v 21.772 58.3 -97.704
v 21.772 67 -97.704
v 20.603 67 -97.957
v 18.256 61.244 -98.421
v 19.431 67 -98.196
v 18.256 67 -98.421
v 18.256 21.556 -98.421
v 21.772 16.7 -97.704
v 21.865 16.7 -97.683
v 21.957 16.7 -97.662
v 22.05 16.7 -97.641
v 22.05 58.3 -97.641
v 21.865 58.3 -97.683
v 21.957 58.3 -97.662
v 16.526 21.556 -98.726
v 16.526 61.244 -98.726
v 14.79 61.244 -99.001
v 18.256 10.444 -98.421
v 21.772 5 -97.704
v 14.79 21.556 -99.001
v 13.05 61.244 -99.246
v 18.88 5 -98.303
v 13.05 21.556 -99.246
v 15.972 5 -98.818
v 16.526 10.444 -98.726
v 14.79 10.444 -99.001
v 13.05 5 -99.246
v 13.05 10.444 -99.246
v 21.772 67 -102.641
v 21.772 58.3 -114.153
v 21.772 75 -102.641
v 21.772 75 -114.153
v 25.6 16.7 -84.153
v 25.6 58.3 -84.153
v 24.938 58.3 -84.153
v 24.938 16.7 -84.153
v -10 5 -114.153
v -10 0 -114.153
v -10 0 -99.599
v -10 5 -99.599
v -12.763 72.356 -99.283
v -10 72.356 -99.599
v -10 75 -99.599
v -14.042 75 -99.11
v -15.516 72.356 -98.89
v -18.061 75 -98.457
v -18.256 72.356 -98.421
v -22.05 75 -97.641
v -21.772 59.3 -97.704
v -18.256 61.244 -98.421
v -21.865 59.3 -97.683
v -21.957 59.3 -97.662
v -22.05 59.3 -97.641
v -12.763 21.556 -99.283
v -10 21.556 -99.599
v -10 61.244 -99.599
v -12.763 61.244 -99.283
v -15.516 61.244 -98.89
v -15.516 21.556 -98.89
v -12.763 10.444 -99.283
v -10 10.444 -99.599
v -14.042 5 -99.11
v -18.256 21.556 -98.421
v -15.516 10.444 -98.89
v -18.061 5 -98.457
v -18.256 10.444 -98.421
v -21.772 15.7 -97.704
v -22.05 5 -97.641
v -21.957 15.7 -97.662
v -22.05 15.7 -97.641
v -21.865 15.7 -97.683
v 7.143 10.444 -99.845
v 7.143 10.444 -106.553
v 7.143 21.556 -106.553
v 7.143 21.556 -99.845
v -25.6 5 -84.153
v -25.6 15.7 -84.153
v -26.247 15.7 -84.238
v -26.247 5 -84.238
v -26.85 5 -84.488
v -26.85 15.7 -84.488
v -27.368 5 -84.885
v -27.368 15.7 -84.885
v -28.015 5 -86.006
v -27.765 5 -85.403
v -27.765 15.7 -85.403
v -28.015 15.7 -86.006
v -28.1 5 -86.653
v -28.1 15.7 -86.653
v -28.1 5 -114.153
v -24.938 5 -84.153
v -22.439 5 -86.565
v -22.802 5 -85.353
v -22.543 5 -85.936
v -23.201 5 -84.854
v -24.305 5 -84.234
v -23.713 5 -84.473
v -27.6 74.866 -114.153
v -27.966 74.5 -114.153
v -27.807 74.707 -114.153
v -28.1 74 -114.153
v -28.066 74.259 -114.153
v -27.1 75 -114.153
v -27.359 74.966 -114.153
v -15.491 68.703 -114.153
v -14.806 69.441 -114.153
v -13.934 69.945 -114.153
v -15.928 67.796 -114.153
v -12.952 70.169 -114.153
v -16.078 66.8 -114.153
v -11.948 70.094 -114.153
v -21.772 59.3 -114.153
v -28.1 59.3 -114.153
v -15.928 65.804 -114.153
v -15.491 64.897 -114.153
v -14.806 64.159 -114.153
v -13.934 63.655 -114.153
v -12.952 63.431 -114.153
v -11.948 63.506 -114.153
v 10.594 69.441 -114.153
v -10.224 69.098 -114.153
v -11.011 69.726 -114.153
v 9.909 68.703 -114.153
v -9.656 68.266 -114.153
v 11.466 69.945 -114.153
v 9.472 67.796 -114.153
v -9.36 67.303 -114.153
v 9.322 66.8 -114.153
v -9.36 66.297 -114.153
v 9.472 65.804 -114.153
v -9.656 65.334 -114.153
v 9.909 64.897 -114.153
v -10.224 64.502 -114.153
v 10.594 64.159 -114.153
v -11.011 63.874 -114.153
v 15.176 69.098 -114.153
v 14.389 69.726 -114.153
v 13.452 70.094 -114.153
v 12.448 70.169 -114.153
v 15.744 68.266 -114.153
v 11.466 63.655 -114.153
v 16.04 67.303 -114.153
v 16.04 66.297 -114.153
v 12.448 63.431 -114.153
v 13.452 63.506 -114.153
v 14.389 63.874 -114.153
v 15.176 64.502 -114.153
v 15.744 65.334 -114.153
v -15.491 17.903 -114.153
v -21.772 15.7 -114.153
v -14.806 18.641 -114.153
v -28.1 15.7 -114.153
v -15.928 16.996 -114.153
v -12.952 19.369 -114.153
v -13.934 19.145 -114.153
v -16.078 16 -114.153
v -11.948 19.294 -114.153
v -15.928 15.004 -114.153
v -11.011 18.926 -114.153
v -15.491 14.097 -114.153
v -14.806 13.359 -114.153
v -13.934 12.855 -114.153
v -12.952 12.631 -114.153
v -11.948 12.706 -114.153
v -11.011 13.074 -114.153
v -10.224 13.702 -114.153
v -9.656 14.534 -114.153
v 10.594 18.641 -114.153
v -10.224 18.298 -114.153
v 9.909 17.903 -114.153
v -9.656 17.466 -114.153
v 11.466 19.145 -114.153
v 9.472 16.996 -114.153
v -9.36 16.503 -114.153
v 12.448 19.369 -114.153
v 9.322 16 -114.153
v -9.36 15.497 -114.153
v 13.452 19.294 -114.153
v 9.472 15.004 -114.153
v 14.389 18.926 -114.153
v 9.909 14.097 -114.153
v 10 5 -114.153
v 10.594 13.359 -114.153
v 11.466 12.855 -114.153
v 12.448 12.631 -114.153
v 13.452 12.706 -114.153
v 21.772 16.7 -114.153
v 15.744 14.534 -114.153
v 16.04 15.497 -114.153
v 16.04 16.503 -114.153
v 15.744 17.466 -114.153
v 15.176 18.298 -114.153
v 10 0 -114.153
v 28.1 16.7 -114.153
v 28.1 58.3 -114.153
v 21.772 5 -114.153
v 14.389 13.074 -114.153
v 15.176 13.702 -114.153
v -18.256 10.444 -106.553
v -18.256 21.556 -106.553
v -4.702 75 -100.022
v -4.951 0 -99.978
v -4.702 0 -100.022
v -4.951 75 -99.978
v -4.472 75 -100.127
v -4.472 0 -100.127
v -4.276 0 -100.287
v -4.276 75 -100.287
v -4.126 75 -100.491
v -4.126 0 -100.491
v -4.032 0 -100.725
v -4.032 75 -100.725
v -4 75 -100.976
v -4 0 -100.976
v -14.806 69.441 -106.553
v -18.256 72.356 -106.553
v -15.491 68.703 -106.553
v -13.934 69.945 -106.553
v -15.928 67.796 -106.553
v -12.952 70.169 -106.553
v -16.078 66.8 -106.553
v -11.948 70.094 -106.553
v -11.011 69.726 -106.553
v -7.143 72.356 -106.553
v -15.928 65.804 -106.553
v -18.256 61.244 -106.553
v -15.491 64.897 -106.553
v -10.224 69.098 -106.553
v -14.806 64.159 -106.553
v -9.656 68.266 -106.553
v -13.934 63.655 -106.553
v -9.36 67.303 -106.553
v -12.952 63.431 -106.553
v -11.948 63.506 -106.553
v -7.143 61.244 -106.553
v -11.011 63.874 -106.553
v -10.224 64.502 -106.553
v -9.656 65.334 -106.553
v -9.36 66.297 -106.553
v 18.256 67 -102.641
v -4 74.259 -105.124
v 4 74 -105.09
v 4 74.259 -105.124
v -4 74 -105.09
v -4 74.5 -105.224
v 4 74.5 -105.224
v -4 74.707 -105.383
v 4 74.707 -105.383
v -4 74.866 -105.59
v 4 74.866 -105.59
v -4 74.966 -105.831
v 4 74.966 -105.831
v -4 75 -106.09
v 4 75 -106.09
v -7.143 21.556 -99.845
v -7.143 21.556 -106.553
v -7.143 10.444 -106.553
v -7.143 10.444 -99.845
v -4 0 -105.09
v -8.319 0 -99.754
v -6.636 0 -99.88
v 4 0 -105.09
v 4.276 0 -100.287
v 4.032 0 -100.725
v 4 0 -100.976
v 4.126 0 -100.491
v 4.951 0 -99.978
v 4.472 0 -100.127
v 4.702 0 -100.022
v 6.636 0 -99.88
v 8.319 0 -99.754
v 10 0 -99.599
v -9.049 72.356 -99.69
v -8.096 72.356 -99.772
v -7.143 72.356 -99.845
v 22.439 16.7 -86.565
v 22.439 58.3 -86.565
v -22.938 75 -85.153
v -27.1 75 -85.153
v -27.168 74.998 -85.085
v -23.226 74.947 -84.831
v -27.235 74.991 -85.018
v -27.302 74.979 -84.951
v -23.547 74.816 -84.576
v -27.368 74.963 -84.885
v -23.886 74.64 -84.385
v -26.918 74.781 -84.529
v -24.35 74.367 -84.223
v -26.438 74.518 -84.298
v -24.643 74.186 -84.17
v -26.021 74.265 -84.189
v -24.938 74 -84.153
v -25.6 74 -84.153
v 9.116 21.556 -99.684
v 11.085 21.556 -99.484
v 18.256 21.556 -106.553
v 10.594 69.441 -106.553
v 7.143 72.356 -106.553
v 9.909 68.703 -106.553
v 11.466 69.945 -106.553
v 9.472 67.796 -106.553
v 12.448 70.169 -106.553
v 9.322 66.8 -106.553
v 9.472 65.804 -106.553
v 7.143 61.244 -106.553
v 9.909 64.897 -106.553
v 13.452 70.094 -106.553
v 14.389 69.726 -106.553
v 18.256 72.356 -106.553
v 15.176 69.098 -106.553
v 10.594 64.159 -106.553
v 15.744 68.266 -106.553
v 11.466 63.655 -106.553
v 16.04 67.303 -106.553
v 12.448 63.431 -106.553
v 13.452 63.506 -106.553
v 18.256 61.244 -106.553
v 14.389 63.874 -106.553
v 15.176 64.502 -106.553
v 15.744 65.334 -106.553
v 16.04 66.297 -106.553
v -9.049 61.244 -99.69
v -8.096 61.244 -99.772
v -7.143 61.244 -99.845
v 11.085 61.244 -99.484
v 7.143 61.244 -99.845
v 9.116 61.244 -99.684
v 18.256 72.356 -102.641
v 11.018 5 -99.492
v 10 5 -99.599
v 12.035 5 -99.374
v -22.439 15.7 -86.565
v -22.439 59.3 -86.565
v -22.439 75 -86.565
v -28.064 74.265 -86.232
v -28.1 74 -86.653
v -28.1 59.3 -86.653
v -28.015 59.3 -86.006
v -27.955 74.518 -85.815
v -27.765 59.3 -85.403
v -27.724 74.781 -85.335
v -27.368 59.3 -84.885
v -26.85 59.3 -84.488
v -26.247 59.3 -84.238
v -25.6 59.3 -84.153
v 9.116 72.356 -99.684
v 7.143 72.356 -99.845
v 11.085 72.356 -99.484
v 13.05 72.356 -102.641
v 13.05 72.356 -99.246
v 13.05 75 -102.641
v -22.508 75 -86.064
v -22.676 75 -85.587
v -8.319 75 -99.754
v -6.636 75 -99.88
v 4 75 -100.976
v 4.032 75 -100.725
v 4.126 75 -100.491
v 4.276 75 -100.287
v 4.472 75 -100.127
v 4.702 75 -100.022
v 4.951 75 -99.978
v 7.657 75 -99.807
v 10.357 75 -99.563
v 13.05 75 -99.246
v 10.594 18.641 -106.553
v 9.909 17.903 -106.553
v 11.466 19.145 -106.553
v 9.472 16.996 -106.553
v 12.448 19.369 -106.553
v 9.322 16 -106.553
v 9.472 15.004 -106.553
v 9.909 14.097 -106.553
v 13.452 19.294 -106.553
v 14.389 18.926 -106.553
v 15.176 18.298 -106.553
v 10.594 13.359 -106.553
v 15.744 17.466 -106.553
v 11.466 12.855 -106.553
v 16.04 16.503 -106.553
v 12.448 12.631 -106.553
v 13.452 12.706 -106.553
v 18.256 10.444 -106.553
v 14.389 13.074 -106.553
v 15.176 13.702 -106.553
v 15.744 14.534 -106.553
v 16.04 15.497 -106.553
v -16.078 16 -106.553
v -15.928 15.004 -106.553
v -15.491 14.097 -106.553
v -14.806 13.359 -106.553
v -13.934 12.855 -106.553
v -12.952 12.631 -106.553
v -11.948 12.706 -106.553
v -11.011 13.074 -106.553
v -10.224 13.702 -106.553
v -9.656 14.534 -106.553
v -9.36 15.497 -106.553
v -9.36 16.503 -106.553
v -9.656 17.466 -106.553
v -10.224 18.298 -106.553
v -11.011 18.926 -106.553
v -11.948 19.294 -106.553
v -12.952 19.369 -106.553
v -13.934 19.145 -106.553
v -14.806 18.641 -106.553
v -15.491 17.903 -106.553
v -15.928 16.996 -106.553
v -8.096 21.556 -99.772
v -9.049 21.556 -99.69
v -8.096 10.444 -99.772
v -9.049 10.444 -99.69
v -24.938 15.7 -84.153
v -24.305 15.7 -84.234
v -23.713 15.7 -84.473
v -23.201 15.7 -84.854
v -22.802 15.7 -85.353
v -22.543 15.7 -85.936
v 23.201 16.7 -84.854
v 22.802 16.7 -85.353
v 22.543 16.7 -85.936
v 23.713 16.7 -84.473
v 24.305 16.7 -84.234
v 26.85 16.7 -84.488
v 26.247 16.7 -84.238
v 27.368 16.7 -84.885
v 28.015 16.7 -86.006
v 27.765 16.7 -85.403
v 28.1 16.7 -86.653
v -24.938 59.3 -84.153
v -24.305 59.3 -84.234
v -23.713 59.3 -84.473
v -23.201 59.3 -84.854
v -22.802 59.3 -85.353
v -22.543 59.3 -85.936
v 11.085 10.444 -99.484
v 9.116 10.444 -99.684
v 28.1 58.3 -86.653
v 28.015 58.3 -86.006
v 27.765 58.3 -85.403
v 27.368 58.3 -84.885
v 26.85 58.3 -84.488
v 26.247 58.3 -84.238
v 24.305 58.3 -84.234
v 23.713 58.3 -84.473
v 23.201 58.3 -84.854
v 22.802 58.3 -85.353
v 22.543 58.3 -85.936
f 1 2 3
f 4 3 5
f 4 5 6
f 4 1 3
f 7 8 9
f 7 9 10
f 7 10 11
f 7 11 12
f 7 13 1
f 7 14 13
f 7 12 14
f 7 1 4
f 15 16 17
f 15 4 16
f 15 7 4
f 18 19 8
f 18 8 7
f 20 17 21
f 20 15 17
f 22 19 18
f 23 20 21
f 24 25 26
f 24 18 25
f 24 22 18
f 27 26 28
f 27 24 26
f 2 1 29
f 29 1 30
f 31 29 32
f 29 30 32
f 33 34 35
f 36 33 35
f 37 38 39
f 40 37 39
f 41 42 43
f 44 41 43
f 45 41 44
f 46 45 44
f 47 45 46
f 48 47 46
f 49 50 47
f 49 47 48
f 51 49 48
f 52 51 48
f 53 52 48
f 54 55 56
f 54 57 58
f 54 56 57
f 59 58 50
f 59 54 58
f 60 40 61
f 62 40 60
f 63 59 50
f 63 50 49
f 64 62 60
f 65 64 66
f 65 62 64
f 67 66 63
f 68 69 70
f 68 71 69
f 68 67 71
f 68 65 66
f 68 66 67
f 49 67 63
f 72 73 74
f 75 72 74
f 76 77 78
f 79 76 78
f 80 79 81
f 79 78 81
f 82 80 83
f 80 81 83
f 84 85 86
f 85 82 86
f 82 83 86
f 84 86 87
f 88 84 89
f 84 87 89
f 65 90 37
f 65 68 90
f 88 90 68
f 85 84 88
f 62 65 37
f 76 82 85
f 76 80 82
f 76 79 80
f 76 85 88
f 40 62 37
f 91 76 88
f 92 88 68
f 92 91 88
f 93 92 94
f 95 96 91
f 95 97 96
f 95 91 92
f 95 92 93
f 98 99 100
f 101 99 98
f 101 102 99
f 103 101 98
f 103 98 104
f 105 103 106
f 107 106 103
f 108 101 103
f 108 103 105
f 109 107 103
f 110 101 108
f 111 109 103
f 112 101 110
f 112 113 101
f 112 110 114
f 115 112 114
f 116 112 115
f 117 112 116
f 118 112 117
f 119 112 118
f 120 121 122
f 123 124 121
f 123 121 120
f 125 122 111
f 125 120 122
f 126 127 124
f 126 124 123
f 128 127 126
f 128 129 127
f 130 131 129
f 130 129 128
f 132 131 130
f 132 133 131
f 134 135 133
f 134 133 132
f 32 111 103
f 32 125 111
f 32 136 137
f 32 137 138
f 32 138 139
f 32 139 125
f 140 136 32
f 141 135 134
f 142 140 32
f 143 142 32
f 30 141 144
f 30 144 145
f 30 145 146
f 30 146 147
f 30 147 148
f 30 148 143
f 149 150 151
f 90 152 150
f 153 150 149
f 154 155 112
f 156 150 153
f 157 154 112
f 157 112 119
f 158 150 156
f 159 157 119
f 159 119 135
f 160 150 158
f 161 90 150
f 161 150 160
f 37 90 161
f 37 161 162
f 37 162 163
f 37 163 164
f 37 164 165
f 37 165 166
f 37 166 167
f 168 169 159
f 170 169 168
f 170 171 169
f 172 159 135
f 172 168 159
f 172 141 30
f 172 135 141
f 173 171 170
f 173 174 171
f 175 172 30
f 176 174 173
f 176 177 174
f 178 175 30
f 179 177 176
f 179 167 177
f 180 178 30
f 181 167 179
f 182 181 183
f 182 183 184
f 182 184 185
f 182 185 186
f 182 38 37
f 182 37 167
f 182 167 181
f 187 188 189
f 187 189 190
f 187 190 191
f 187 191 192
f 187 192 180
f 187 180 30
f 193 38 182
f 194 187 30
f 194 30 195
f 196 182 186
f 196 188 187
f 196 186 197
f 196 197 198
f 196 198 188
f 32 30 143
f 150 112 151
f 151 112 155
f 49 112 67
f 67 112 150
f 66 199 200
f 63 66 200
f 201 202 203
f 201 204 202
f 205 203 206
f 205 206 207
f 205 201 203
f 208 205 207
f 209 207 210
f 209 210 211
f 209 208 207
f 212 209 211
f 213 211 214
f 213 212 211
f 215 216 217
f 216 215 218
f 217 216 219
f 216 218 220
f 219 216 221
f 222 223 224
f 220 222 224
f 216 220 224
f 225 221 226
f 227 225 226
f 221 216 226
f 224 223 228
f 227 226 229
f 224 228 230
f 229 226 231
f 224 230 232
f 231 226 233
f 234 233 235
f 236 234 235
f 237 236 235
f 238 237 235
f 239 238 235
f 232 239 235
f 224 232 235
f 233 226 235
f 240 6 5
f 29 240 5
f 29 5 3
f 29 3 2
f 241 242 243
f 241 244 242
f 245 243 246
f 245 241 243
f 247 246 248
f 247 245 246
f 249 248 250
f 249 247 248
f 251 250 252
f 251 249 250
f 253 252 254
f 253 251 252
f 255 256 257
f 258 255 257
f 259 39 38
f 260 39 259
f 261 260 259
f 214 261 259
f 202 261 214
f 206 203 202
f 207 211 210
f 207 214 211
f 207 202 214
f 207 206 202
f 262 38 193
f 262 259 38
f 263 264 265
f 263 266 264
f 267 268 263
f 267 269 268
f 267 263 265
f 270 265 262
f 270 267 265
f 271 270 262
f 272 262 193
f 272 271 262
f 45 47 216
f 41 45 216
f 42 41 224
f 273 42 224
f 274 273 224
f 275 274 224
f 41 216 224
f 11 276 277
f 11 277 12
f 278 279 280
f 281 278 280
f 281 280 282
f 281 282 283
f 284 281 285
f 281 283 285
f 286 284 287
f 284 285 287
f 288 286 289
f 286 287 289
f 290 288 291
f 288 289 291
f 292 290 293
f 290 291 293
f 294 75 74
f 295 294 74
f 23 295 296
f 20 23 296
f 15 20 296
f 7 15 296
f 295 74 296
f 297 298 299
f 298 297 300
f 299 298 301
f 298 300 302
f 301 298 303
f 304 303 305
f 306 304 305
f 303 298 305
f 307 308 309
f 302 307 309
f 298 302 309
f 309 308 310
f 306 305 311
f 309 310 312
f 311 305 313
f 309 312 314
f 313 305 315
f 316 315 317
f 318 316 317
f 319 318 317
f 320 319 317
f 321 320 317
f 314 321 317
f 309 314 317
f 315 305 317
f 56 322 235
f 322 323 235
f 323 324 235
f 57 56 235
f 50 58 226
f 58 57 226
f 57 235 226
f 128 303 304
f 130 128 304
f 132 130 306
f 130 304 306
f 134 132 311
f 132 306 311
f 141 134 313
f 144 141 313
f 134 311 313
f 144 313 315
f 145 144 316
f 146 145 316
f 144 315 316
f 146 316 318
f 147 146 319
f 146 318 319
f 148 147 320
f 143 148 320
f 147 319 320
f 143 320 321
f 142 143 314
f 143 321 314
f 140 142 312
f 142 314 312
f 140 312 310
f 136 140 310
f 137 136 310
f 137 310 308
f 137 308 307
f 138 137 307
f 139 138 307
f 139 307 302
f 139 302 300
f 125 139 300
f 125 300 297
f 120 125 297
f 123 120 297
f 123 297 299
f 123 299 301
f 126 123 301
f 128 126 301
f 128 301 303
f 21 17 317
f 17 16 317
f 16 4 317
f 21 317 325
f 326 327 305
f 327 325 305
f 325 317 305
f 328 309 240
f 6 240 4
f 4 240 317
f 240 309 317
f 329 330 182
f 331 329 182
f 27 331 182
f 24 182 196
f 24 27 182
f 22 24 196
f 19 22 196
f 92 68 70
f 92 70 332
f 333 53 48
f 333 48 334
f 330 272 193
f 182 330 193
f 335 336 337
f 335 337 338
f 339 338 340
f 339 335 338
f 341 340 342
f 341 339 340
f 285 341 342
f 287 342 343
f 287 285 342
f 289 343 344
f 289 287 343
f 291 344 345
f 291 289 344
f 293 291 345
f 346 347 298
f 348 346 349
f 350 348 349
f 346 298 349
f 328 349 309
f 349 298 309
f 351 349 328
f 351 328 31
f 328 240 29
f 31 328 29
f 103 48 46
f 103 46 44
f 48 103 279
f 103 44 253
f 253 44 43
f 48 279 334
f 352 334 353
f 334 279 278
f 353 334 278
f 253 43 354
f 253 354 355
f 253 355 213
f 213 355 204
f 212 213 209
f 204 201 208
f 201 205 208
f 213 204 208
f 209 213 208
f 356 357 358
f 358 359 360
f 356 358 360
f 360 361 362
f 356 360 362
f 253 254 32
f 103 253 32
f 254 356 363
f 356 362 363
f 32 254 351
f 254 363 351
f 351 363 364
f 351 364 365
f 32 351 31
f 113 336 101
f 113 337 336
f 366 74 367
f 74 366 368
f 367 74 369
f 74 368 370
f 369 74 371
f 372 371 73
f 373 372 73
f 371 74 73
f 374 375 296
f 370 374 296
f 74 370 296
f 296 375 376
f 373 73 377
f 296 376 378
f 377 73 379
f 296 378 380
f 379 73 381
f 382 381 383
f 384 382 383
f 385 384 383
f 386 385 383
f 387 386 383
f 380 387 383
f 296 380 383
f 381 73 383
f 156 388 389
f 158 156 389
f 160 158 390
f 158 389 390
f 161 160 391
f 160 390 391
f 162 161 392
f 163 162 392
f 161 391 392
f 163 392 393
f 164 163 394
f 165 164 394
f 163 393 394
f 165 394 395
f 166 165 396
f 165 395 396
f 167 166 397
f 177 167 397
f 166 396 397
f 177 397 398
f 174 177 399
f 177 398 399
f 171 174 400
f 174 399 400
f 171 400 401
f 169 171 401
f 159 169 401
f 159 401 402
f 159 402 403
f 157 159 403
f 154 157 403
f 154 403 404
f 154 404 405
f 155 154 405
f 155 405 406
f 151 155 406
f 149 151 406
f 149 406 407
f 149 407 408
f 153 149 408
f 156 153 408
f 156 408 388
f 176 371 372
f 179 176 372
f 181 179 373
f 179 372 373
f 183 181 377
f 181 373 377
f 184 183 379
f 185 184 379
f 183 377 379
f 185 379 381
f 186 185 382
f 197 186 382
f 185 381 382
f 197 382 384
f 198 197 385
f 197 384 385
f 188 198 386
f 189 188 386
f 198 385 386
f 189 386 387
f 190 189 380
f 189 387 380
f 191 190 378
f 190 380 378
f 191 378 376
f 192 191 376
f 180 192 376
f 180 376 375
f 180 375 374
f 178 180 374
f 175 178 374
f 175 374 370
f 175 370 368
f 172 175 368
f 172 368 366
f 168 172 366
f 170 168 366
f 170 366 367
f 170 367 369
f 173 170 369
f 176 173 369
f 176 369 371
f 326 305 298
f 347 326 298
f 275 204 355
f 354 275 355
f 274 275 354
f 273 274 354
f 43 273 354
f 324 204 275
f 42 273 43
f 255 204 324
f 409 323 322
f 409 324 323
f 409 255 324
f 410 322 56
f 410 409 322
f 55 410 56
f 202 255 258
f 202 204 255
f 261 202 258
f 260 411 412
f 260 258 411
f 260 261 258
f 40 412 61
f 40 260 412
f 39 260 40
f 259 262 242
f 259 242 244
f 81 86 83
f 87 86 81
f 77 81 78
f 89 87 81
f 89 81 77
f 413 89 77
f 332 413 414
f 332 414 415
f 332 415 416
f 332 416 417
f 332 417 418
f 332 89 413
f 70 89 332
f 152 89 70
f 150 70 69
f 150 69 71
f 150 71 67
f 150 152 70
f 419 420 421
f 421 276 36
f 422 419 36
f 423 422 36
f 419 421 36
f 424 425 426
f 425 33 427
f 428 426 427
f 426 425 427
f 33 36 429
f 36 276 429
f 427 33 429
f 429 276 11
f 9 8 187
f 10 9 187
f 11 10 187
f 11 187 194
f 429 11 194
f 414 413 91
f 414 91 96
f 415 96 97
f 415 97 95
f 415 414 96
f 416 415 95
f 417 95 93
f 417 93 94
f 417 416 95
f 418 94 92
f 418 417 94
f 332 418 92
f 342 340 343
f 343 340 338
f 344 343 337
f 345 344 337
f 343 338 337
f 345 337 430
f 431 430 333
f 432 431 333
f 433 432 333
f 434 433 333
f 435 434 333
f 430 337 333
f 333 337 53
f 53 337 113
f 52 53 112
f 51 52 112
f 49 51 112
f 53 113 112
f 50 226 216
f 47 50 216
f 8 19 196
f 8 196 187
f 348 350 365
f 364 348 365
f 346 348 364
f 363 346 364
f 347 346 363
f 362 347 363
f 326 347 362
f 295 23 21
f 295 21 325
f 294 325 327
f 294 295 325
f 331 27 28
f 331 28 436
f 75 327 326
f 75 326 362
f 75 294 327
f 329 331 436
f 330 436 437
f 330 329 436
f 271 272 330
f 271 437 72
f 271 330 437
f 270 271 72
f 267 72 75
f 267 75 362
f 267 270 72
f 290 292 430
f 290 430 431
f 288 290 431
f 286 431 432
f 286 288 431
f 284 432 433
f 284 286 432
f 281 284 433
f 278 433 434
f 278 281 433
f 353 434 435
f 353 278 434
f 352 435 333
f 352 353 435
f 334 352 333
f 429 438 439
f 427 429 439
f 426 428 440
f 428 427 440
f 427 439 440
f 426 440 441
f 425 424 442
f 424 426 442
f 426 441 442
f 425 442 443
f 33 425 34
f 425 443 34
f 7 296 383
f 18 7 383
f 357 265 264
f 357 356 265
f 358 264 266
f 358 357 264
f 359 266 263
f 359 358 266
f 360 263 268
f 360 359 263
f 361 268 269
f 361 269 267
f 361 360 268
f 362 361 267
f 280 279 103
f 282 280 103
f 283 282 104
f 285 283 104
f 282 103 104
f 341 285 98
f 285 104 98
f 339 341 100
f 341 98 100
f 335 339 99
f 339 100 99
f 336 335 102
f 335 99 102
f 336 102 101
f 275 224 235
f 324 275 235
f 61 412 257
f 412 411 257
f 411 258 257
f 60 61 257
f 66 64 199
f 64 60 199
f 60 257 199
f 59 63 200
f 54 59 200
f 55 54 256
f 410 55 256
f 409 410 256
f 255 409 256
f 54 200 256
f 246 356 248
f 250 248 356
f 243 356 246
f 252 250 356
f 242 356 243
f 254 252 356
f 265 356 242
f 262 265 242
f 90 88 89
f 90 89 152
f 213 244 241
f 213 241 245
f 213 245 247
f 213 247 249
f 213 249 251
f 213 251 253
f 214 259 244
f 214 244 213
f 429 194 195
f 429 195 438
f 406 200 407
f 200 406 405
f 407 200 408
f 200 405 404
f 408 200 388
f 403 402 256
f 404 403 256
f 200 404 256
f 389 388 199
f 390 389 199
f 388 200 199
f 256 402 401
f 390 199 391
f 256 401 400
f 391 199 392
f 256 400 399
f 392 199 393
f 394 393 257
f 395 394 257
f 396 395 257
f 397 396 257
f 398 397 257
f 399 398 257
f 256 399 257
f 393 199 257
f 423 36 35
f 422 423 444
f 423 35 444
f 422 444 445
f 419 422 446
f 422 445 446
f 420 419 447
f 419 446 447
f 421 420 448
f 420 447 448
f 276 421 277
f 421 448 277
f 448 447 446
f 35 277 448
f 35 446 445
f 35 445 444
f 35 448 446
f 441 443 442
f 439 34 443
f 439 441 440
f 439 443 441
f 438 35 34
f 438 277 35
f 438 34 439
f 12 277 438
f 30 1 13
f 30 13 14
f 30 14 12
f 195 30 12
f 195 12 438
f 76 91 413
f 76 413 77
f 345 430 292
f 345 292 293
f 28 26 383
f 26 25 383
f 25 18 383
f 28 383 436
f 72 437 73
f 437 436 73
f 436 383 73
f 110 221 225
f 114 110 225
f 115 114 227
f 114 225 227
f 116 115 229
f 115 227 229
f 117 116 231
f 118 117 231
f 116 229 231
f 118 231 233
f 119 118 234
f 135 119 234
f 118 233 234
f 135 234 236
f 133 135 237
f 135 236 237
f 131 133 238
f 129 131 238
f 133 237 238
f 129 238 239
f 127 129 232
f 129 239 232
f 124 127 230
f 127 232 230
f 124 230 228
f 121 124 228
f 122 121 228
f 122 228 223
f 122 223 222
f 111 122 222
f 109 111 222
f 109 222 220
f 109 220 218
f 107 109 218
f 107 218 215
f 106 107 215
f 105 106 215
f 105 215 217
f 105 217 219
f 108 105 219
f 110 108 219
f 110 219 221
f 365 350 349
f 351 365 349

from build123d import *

# Parameters (mm, degrees)
F1_DEPTH     = 75
F3_START     = -67
F3_DEPTH     = 8
F4_D         = 6.7564
F5_START     = -7.6
F2_W         = 5.5565
F2_H         = 5.5565
F5_DEPTH     = 22.401
F2_W_2       = 6.328
F2_H_2       = 8.3
F2_H_3       = 43.6
F2_H_4       = 8.4
F2_H_5       = 16.7
F2_H_6       = 0.7
F6_DEPTH     = 30
F7_R         = 1
F8_DEPTH     = 5
F9_T1_DEPTH  = 23.2
F9_T3_DEPTH  = 22.7686226101
F9_T5_DEPTH  = 27.2
F9_T7_DEPTH  = 26.7686226101
F9_T9_DEPTH  = 53.6686226101
F9_T11_DEPTH = 54.1


# Not quite as in the source:
# - a fillet or chamfer that OpenCascade refuses, or shapes differently, is made with other operations: its cross-section is extruded or revolved along the edge and cut away or added
# - a feature names something its author has since deleted; it is built from what else it names


with BuildPart() as f1:
    # F0 (on Front) → F1 (new body)
    with BuildSketch(Plane.XZ):
        with BuildLine():
            Line((-25, -84.153), (-25, -96.9278597721))
            ThreePointArc((-25, -96.9278597721), (-23.5277037783, -97.2957201264), (-22.05, -97.6412182431))
            Line((-22.05, -97.6412182431), (-22.5238, -84.153))
            Line((-22.5238, -84.153), (-25, -84.153))
        make_face()
        with BuildLine():
            ThreePointArc((22.05, -97.6412182431), (23.5277037782, -97.2957201264), (25, -96.9278597721))
            Line((25, -96.9278597721), (25, -84.153))
            Line((25, -84.153), (22.5238, -84.153))
            Line((22.5238, -84.153), (22.05, -97.6412182431))
        make_face()
        with BuildLine():
            Line((22.05, -102.6412182431), (22.05, -97.6412182431))
            ThreePointArc((22.05, -97.6412182431), (17.5683261722, -98.5462526711), (13.05, -99.2456926017))
            Line((13.05, -99.2456926017), (13.05, -102.6412182431))
            Line((13.05, -102.6412182431), (22.05, -102.6412182431))
        make_face()
        with BuildLine():
            ThreePointArc((-4, -100.0200479904), (-7.0031613127, -99.8547231313), (-10, -99.5992469851))
            Line((-10, -99.5992469851), (-10, -114.153))
            Line((-10, -114.153), (0, -114.153))
            Line((0, -114.153), (10, -114.153))
            Line((10, -114.153), (10, -99.5992469851))
            ThreePointArc((10, -99.5992469851), (7.0031613127, -99.8547231313), (4, -100.0200479904))
            Line((4, -100.0200479904), (4, -105.0902182431))
            Line((4, -105.0902182431), (-4, -105.0902182431))
            Line((-4, -105.0902182431), (-4, -100.0200479904))
        make_face()
        with BuildLine():
            ThreePointArc((-25, -96.9278597721), (-26.5533240856, -96.5138900884), (-28.0998, -96.0750292217))
            Line((-28.0998, -96.0750292217), (-28.0998, -104.153))
            Line((-28.0998, -104.153), (-28.0998, -114.153))
            Line((-28.0998, -114.153), (-25, -114.153))
            Line((-25, -114.153), (-25, -96.9278597721))
        make_face()
        with BuildLine():
            Line((28.0998, -104.153), (28.0998, -96.0750292217))
            ThreePointArc((28.0998, -96.0750292217), (26.5533240856, -96.5138900884), (25, -96.9278597721))
            Line((25, -96.9278597721), (25, -114.153))
            Line((25, -114.153), (28.0998, -114.153))
            Line((28.0998, -114.153), (28.0998, -104.153))
        make_face()
        with BuildLine():
            ThreePointArc((25, -96.9278597721), (26.5533240856, -96.5138900884), (28.0998, -96.0750292217))
            Line((28.0998, -96.0750292217), (28.0998, -84.153))
            Line((28.0998, -84.153), (25, -84.153))
            Line((25, -84.153), (25, -96.9278597721))
        make_face()
        with BuildLine():
            Line((-28.0998, -84.153), (-28.0998, -96.0750292217))
            ThreePointArc((-28.0998, -96.0750292217), (-26.5533240856, -96.5138900884), (-25, -96.9278597721))
            Line((-25, -96.9278597721), (-25, -84.153))
            Line((-25, -84.153), (-28.0998, -84.153))
        make_face()
        with BuildLine():
            Line((25, -114.153), (25, -96.9278597721))
            ThreePointArc((25, -96.9278597721), (23.5277037782, -97.2957201264), (22.05, -97.6412182431))
            Line((22.05, -97.6412182431), (22.05, -102.6412182431))
            Line((22.05, -102.6412182431), (13.05, -102.6412182431))
            Line((13.05, -102.6412182431), (13.05, -99.2456926017))
            ThreePointArc((13.05, -99.2456926017), (11.5263556763, -99.4341647766), (10, -99.5992469851))
            Line((10, -99.5992469851), (10, -114.153))
            Line((10, -114.153), (22.5238, -114.153))
            Line((22.5238, -114.153), (25, -114.153))
        make_face()
        with BuildLine():
            ThreePointArc((-22.05, -97.6412182431), (-23.5277037783, -97.2957201264), (-25, -96.9278597721))
            Line((-25, -96.9278597721), (-25, -114.153))
            Line((-25, -114.153), (-22.5238, -114.153))
            Line((-22.5238, -114.153), (-10, -114.153))
            Line((-10, -114.153), (-10, -99.5992469851))
            ThreePointArc((-10, -99.5992469851), (-16.0548775809, -98.8041036894), (-22.05, -97.6412182431))
        make_face()
    extrude(amount=-F1_DEPTH)

    # F0 (on Front) → F3 (cut)
    with BuildSketch(Plane.XZ.offset(F3_START)):
        with BuildLine():
            Line((22.05, -102.6412182431), (22.05, -97.6412182431))
            ThreePointArc((22.05, -97.6412182431), (17.5683261722, -98.5462526711), (13.05, -99.2456926017))
            Line((13.05, -99.2456926017), (13.05, -102.6412182431))
            Line((13.05, -102.6412182431), (22.05, -102.6412182431))
        make_face()
    extrude(amount=-F3_DEPTH, mode=Mode.SUBTRACT)

    # F4 (through all)
    with Locations(Plane(origin=(0, 0, -114.153), x_dir=(1, 0, 0), z_dir=(0, 0, -1))):
        with Locations((-12.7, -168.4), (12.7, -168.4), (-12.7, -117.6), (12.7, -117.6), (-12.7, -66.8), (12.7, -66.8), (-12.7, -16), (12.7, -16)):
            Hole(F4_D / 2)

    # F2 (on face) → F5 (cut)
    with BuildSketch(Plane(origin=(0, 0, -114.153), x_dir=(1, 0, 0), z_dir=(0, 0, -1)).offset(F5_START)):
        Polygon((-12.7, -173.9565), (-12.7, -168.4), (-12.7, -162.8435), (-18.2565, -162.8435), (-18.2565, -173.9565), align=None)
        with Locations((-9.92175, -165.62175)):
            Rectangle(F2_W, F2_H)
        with Locations((-9.92175, -171.17825)):
            Rectangle(F2_W, F2_H)
        with Locations((9.92175, -171.17825)):
            Rectangle(F2_W, F2_H)
        with Locations((9.92175, -165.62175)):
            Rectangle(F2_W, F2_H)
        Polygon((12.7, -162.8435), (12.7, -168.4), (12.7, -173.9565), (18.2565, -173.9565), (18.2565, -162.8435), align=None)
        Polygon((18.2565, -112.0435), (12.7, -112.0435), (12.7, -117.6), (12.7, -123.1565), (18.2565, -123.1565), align=None)
        with Locations((9.92175, -114.82175)):
            Rectangle(F2_W, F2_H)
        with Locations((9.92175, -120.37825)):
            Rectangle(F2_W, F2_H)
        with Locations((-9.92175, -120.37825)):
            Rectangle(F2_W, F2_H)
        with Locations((-9.92175, -114.82175)):
            Rectangle(F2_W, F2_H)
        Polygon((-12.7, -117.6), (-12.7, -112.0435), (-18.2565, -112.0435), (-18.2565, -123.1565), (-12.7, -123.1565), align=None)
        with Locations((-9.92175, -64.02175)):
            Rectangle(F2_W, F2_H)
        with Locations((-9.92175, -69.57825)):
            Rectangle(F2_W, F2_H)
        Polygon((-12.7, -72.3565), (-12.7, -66.8), (-12.7, -61.2435), (-18.2565, -61.2435), (-18.2565, -72.3565), align=None)
        with Locations((9.92175, -64.02175)):
            Rectangle(F2_W, F2_H)
        with Locations((9.92175, -69.57825)):
            Rectangle(F2_W, F2_H)
        Polygon((12.7, -61.2435), (12.7, -66.8), (12.7, -72.3565), (18.2565, -72.3565), (18.2565, -61.2435), align=None)
        with Locations((9.92175, -18.77825)):
            Rectangle(F2_W, F2_H)
        with Locations((9.92175, -13.22175)):
            Rectangle(F2_W, F2_H)
        Polygon((18.2565, -10.4435), (12.7, -10.4435), (12.7, -16), (12.7, -21.5565), (18.2565, -21.5565), align=None)
        with Locations((-9.92175, -13.22175)):
            Rectangle(F2_W, F2_H)
        Polygon((-12.7, -16), (-12.7, -10.4435), (-18.2565, -10.4435), (-18.2565, -21.5565), (-12.7, -21.5565), align=None)
        with Locations((-9.92175, -18.77825)):
            Rectangle(F2_W, F2_H)
    extrude(amount=-F5_DEPTH, mode=Mode.SUBTRACT)

    # F2 (on face) → F6 (cut, through all)
    with BuildSketch(Plane(origin=(0, 0, -114.153), x_dir=(1, 0, 0), z_dir=(0, 0, -1))):
        with Locations((24.9358, -70.85)):
            Rectangle(F2_W_2, F2_H_2)
        with Locations((-24.9358, -37.5)):
            Rectangle(F2_W_2, F2_H_3)
        with Locations((24.9358, -62.5)):
            Rectangle(F2_W_2, F2_H_4)
        with Locations((24.9358, -8.35)):
            Rectangle(F2_W_2, F2_H_5)
        with Locations((24.9358, 0.35)):
            Rectangle(F2_W_2, F2_H_6)
    extrude(amount=-F6_DEPTH, mode=Mode.SUBTRACT)

    # F7
    f7_edges = [f1.edges().sort_by_distance(p)[0] for p in [
        (-28.0998, 75, -99.153),
        (-4, 37.5, -100.020048),
        (4, 37.5, -100.020048),
        (0, 75, -105.090218),
        (-25.3118, 75, -84.153),
    ]]
    fillet(f7_edges, radius=F7_R)

    # F0 (on Front) → F8 (cut)
    with BuildSketch(Plane.XZ):
        with BuildLine():
            ThreePointArc((-22.05, -97.6412182431), (-23.5277037783, -97.2957201264), (-25, -96.9278597721))
            Line((-25, -96.9278597721), (-25, -114.153))
            Line((-25, -114.153), (-22.5238, -114.153))
            Line((-22.5238, -114.153), (-10, -114.153))
            Line((-10, -114.153), (-10, -99.5992469851))
            ThreePointArc((-10, -99.5992469851), (-16.0548775809, -98.8041036894), (-22.05, -97.6412182431))
        make_face()
        with BuildLine():
            Line((25, -114.153), (25, -96.9278597721))
            ThreePointArc((25, -96.9278597721), (23.5277037782, -97.2957201264), (22.05, -97.6412182431))
            Line((22.05, -97.6412182431), (22.05, -102.6412182431))
            Line((22.05, -102.6412182431), (13.05, -102.6412182431))
            Line((13.05, -102.6412182431), (13.05, -99.2456926017))
            ThreePointArc((13.05, -99.2456926017), (11.5263556763, -99.4341647766), (10, -99.5992469851))
            Line((10, -99.5992469851), (10, -114.153))
            Line((10, -114.153), (22.5238, -114.153))
            Line((22.5238, -114.153), (25, -114.153))
        make_face()
        with BuildLine():
            Line((22.05, -102.6412182431), (22.05, -97.6412182431))
            ThreePointArc((22.05, -97.6412182431), (17.5683261722, -98.5462526711), (13.05, -99.2456926017))
            Line((13.05, -99.2456926017), (13.05, -102.6412182431))
            Line((13.05, -102.6412182431), (22.05, -102.6412182431))
        make_face()
        with BuildLine():
            ThreePointArc((-25, -96.9278597721), (-26.5533240856, -96.5138900884), (-28.0998, -96.0750292217))
            Line((-28.0998, -96.0750292217), (-28.0998, -104.153))
            Line((-28.0998, -104.153), (-28.0998, -114.153))
            Line((-28.0998, -114.153), (-25, -114.153))
            Line((-25, -114.153), (-25, -96.9278597721))
        make_face()
        with BuildLine():
            Line((-28.0998, -84.153), (-28.0998, -96.0750292217))
            ThreePointArc((-28.0998, -96.0750292217), (-26.5533240856, -96.5138900884), (-25, -96.9278597721))
            Line((-25, -96.9278597721), (-25, -84.153))
            Line((-25, -84.153), (-28.0998, -84.153))
        make_face()
        with BuildLine():
            Line((-25, -84.153), (-25, -96.9278597721))
            ThreePointArc((-25, -96.9278597721), (-23.5277037783, -97.2957201264), (-22.05, -97.6412182431))
            Line((-22.05, -97.6412182431), (-22.5238, -84.153))
            Line((-22.5238, -84.153), (-25, -84.153))
        make_face()
    extrude(amount=-F8_DEPTH, mode=Mode.SUBTRACT)

    # F9: fillet of radius 2.5 on 6 edges, made by hand

    # F9_s2 → F9_t1 (cut)
    with BuildSketch(Plane.XZ.offset(-21.95)):
        with BuildLine():
            ThreePointArc((-25.5998, -84.153), (-27.367566953, -84.885233047), (-28.0998, -86.653))
            Line((-28.0998, -86.653), (-28.0998, -84.153))
            Line((-28.0998, -84.153), (-25.5998, -84.153))
        make_face()
    extrude(amount=F9_T1_DEPTH, mode=Mode.SUBTRACT)

    # F9_s4 → F9_t3 (cut)
    with BuildSketch(Plane.XZ.offset(-21.7343113051)):
        with BuildLine():
            ThreePointArc((-24.937524522, -84.153), (-23.2010637724, -84.8544716947), (-22.4390654746, -86.565236748))
            Line((-22.4390654746, -86.565236748), (-22.5238, -84.153))
            Line((-22.5238, -84.153), (-24.937524522, -84.153))
        make_face()
    extrude(amount=F9_T3_DEPTH, mode=Mode.SUBTRACT)

    # F9_s6 → F9_t5 (cut)
    with BuildSketch(Plane.XZ.offset(-80.25)):
        with BuildLine():
            ThreePointArc((-28.0998, -86.653), (-27.367566953, -84.885233047), (-25.5998, -84.153))
            Line((-25.5998, -84.153), (-28.0998, -84.153))
            Line((-28.0998, -84.153), (-28.0998, -86.653))
        make_face()
    extrude(amount=F9_T5_DEPTH, mode=Mode.SUBTRACT)

    # F9_s8 → F9_t7 (cut)
    with BuildSketch(Plane.XZ.offset(-80.0343113051)):
        with BuildLine():
            ThreePointArc((-24.937524522, -84.153), (-23.2010637724, -84.8544716947), (-22.4390654746, -86.565236748))
            Line((-22.4390654746, -86.565236748), (-22.5238, -84.153))
            Line((-22.5238, -84.153), (-24.937524522, -84.153))
        make_face()
    extrude(amount=F9_T7_DEPTH, mode=Mode.SUBTRACT)

    # F9_s10 → F9_t9 (cut)
    with BuildSketch(Plane.XZ.offset(-64.3343113051)):
        with BuildLine():
            ThreePointArc((24.937524522, -84.153), (23.2010637724, -84.8544716947), (22.4390654746, -86.565236748))
            Line((22.4390654746, -86.565236748), (22.5238, -84.153))
            Line((22.5238, -84.153), (24.937524522, -84.153))
        make_face()
    extrude(amount=F9_T9_DEPTH, mode=Mode.SUBTRACT)

    # F9_s12 → F9_t11 (cut)
    with BuildSketch(Plane.XZ.offset(-64.55)):
        with BuildLine():
            ThreePointArc((28.0998, -86.653), (27.367566953, -84.885233047), (25.5998, -84.153))
            Line((25.5998, -84.153), (28.0998, -84.153))
            Line((28.0998, -84.153), (28.0998, -86.653))
        make_face()
    extrude(amount=F9_T11_DEPTH, mode=Mode.SUBTRACT)


solid = f1.part
